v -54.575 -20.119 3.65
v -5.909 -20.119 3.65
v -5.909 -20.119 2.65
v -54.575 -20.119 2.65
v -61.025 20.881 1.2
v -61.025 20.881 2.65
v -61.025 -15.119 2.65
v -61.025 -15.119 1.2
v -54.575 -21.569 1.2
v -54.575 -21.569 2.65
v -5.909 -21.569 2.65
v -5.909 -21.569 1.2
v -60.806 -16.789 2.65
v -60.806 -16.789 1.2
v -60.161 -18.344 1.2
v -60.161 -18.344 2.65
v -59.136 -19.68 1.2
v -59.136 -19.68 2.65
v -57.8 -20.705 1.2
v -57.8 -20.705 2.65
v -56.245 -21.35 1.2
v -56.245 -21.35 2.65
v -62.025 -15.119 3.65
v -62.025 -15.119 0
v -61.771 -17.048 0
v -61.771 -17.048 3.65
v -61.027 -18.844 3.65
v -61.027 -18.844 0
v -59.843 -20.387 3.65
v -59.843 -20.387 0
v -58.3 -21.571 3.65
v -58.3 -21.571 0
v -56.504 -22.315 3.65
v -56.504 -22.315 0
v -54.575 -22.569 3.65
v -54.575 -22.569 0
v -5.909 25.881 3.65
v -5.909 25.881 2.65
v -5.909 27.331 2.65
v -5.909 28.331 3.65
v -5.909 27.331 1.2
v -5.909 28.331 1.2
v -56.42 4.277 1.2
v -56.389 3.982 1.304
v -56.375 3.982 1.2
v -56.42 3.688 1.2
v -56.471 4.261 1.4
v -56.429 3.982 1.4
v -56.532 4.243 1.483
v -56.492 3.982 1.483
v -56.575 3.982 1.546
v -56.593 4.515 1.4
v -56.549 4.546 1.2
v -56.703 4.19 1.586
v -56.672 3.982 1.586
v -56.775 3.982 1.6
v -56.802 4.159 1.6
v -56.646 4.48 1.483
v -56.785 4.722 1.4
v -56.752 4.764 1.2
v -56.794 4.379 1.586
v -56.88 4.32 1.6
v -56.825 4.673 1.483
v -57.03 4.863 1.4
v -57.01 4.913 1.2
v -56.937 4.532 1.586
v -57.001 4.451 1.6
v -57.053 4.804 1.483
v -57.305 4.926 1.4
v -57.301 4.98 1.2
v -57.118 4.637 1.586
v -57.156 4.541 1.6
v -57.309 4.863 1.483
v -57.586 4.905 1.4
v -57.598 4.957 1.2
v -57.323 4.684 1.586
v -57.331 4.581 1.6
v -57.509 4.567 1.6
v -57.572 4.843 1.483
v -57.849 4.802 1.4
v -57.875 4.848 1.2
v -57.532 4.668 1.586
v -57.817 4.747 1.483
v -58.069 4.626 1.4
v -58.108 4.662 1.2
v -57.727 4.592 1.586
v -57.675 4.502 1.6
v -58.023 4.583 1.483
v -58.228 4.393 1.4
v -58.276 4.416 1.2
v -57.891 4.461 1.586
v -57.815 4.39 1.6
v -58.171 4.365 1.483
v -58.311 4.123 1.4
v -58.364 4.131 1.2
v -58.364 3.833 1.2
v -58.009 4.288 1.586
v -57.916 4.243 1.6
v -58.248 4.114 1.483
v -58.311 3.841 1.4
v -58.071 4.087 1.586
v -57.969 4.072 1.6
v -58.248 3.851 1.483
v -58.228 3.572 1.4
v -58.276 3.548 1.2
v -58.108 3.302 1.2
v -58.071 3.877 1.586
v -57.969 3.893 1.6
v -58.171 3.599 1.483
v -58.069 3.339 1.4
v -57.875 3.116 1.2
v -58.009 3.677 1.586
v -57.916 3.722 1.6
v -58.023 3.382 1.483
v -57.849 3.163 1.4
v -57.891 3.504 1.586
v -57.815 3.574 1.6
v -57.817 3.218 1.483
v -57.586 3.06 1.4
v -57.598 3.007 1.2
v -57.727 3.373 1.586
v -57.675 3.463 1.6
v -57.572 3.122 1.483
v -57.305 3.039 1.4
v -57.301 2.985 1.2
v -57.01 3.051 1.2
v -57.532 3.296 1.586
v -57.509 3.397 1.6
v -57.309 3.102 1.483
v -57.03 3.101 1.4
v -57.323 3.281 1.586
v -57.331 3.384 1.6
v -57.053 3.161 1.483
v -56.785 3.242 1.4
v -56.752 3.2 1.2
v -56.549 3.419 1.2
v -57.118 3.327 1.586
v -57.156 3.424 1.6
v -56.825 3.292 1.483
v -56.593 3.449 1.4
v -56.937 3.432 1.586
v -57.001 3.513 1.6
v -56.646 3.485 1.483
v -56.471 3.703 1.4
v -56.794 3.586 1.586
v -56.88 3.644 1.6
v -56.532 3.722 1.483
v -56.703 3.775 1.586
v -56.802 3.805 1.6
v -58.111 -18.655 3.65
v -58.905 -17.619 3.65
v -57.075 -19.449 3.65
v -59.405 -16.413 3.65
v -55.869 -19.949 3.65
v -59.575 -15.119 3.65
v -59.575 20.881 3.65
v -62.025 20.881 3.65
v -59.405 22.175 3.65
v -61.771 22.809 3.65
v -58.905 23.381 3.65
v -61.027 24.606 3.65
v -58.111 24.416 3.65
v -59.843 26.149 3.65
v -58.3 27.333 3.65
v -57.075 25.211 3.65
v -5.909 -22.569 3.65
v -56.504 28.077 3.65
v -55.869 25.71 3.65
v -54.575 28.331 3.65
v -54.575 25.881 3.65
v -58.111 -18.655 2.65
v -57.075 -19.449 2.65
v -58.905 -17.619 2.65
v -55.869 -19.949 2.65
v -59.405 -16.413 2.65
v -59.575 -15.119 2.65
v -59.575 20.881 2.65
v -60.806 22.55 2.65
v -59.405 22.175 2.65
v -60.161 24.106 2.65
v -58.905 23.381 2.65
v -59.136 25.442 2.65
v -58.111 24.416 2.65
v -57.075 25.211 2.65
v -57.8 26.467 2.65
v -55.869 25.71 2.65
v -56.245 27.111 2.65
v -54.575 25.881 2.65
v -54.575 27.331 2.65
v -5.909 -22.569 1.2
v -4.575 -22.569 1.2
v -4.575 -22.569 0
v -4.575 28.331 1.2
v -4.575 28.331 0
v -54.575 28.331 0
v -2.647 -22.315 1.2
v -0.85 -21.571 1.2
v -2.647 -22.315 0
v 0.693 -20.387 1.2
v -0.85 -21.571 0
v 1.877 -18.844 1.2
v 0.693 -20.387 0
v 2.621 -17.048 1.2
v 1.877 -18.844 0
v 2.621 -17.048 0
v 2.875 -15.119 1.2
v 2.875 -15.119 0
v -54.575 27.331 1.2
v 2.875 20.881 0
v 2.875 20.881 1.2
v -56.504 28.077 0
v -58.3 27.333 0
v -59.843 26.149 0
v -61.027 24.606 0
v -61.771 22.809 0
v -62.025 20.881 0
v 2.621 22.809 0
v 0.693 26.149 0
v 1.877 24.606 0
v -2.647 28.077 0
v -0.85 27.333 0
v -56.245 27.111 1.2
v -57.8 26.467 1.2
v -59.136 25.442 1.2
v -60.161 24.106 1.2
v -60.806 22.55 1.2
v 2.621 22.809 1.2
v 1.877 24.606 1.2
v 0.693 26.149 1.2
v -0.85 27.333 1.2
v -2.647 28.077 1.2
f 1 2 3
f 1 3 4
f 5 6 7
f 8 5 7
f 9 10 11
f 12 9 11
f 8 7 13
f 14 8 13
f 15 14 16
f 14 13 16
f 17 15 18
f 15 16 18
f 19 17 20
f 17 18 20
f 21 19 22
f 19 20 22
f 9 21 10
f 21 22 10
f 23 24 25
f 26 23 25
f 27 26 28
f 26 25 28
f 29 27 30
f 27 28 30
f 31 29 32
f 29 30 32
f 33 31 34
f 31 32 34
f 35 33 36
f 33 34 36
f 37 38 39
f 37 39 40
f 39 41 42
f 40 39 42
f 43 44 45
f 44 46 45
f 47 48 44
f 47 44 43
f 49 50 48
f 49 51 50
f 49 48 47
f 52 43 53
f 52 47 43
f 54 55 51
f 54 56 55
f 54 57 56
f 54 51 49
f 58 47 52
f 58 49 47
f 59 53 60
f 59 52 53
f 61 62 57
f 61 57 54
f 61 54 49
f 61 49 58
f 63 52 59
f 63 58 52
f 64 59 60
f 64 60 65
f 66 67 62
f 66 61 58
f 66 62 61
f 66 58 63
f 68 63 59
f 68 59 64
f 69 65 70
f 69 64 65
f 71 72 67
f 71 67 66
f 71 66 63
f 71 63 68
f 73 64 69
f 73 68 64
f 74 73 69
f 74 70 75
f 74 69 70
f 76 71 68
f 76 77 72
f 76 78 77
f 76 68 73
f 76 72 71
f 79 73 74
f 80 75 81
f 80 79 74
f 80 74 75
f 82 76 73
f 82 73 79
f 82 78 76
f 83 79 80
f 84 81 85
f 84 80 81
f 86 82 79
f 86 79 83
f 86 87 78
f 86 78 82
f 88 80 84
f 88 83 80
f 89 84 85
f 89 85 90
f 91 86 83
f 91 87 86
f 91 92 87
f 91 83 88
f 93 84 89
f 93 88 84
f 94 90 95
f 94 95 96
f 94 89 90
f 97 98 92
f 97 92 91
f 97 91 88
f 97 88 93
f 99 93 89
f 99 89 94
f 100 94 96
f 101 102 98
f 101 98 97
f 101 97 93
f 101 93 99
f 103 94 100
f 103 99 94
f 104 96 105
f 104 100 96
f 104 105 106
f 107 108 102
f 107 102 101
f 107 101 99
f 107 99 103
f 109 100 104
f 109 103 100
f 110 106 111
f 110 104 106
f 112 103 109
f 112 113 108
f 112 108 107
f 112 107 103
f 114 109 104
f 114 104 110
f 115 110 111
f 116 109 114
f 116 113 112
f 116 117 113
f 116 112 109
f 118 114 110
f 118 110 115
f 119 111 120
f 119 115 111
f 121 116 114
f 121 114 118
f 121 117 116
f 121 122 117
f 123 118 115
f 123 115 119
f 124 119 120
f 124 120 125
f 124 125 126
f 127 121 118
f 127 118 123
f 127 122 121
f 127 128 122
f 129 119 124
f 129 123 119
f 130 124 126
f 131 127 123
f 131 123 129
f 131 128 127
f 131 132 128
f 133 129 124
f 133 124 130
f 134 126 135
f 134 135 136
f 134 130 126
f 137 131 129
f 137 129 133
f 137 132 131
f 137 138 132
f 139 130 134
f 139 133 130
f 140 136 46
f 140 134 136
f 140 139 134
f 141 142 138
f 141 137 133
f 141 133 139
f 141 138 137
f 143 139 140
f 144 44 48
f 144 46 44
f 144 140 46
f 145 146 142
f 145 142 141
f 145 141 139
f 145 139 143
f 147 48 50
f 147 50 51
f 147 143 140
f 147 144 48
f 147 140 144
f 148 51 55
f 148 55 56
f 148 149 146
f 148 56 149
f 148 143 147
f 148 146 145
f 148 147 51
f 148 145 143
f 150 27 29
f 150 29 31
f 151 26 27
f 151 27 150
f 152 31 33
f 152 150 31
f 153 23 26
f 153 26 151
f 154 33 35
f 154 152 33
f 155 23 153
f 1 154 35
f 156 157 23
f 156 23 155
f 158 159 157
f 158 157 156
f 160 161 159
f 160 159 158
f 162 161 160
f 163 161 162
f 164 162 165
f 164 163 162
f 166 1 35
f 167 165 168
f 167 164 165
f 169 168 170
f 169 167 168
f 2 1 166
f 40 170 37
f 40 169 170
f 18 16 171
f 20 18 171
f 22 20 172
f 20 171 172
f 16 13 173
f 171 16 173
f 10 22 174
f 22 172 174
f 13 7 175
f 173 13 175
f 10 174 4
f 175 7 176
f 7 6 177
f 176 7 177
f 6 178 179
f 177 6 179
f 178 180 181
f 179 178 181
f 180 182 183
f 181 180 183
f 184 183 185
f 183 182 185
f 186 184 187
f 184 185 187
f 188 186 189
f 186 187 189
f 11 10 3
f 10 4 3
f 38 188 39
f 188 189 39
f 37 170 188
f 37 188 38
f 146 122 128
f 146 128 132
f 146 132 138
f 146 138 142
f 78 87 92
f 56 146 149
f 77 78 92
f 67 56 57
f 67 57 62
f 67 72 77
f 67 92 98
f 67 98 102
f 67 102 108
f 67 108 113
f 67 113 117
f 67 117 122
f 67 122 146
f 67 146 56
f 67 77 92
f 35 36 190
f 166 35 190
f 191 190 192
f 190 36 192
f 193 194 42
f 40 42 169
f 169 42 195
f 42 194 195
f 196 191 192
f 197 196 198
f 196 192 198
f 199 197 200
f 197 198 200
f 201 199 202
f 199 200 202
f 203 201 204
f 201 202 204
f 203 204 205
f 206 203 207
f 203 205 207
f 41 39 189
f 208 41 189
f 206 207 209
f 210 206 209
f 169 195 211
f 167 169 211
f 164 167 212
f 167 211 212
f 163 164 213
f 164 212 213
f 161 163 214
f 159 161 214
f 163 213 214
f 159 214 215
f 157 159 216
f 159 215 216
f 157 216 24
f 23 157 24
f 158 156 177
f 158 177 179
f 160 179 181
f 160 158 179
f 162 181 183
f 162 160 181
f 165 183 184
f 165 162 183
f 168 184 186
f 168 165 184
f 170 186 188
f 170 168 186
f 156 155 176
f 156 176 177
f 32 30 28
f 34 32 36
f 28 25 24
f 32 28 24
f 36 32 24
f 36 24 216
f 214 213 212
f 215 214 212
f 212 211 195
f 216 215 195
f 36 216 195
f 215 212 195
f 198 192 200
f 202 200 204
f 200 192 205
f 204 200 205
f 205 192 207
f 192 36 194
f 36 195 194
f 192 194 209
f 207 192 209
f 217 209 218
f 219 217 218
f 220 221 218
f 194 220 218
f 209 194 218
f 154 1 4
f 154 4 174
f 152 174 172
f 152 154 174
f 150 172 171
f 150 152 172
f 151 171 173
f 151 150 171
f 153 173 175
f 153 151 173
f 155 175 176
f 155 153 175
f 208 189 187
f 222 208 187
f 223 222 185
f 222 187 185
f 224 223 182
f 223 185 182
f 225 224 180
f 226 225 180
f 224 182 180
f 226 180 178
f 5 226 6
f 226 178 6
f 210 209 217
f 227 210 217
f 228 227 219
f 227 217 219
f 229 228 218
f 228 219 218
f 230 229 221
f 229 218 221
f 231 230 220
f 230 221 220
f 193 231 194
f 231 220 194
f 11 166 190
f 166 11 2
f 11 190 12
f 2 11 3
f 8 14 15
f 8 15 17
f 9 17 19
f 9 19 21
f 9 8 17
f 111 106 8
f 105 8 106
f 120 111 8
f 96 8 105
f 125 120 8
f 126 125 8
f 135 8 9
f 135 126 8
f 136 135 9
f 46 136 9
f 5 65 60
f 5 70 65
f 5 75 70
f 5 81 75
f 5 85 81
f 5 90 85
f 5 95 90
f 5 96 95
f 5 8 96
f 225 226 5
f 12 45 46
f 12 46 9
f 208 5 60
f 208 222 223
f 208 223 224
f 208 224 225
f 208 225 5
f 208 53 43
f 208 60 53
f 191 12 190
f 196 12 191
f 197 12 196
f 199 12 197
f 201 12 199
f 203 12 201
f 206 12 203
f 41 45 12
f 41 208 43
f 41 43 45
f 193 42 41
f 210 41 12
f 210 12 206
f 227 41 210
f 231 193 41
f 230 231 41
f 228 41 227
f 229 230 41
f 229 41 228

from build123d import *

# Parameters (mm, degrees)
F1_DEPTH = 3.65
F3_DEPTH = 2.45
F5_DEPTH = 1
F6_W     = 11.5363439545
F6_H     = 60.74937433
F7_DEPTH = 25
F8_R     = 1
F9_DEPTH = 0.4
F10_R    = 0.39999


# Not quite as in the source:
# - a fillet or chamfer is up to 0.001 mm smaller than in the source, because OpenCascade refuses the exact size


with BuildPart() as f1:
    # F0 (on Top) → F1 (new body)
    with BuildSketch(Plane.XY):
        with BuildLine():
            ThreePointArc((-62.0253431911, -15.11933375), (-59.843288711, -20.3872792698), (-54.5753431911, -22.56933375))
            Line((-54.5753431911, -22.56933375), (-4.5753431911, -22.56933375))
            ThreePointArc((-4.5753431911, -22.56933375), (0.6926023287, -20.3872792698), (2.8746568089, -15.11933375))
            Line((2.8746568089, -15.11933375), (2.8746568089, 20.88066625))
            ThreePointArc((2.8746568089, 20.88066625), (0.6926023287, 26.1486117698), (-4.5753431911, 28.33066625))
            Line((-4.5753431911, 28.33066625), (-54.5753431911, 28.33066625))
            ThreePointArc((-54.5753431911, 28.33066625), (-59.843288711, 26.1486117698), (-62.0253431911, 20.88066625))
            Line((-62.0253431911, 20.88066625), (-62.0253431911, -15.11933375))
        make_face()
    extrude(amount=F1_DEPTH)

    # F2 (on face) → F3 (cut)
    with BuildSketch(Plane.XY.offset(3.65)):
        with BuildLine():
            Line((1.8746568089, -15.11933375), (1.8746568089, 20.88066625))
            ThreePointArc((1.8746568089, 20.88066625), (-0.0145044525, 25.4415049886), (-4.5753431911, 27.33066625))
            Line((-4.5753431911, 27.33066625), (-54.5753431911, 27.33066625))
            ThreePointArc((-54.5753431911, 27.33066625), (-59.1361819298, 25.4415049886), (-61.0253431911, 20.88066625))
            Line((-61.0253431911, 20.88066625), (-61.0253431911, -15.11933375))
            ThreePointArc((-61.0253431911, -15.11933375), (-59.1361819298, -19.6801724887), (-54.5753431911, -21.56933375))
            Line((-54.5753431911, -21.56933375), (-4.5753431911, -21.56933375))
            ThreePointArc((-4.5753431911, -21.56933375), (-0.0145044525, -19.6801724887), (1.8746568089, -15.11933375))
        make_face()
    extrude(amount=-F3_DEPTH, mode=Mode.SUBTRACT)

    # F4 (on face) → F5 (join)
    with BuildSketch(Plane.XY.offset(3.65)):
        with BuildLine():
            Line((1.8746568089, -15.11933375), (1.8746568089, 20.88066625))
            ThreePointArc((1.8746568089, 20.88066625), (-0.0145044525, 25.4415049886), (-4.5753431911, 27.33066625))
            Line((-4.5753431911, 27.33066625), (-54.5753431911, 27.33066625))
            ThreePointArc((-54.5753431911, 27.33066625), (-59.1361819298, 25.4415049886), (-61.0253431911, 20.88066625))
            Line((-61.0253431911, 20.88066625), (-61.0253431911, -15.11933375))
            ThreePointArc((-61.0253431911, -15.11933375), (-59.1361819298, -19.6801724887), (-54.5753431911, -21.56933375))
            Line((-54.5753431911, -21.56933375), (-4.5753431911, -21.56933375))
            ThreePointArc((-4.5753431911, -21.56933375), (-0.0145044525, -19.6801724887), (1.8746568089, -15.11933375))
        make_face()
        with BuildLine():
            ThreePointArc((-4.5753431911, 25.88066625), (-1.0398092852, 24.4162001559), (0.4246568089, 20.88066625))
            Line((0.4246568089, 20.88066625), (0.4246568089, -15.11933375))
            ThreePointArc((0.4246568089, -15.11933375), (-1.0398092852, -18.6548676559), (-4.5753431911, -20.11933375))
            Line((-4.5753431911, -20.11933375), (-54.5753431911, -20.11933375))
            ThreePointArc((-54.5753431911, -20.11933375), (-58.1108770971, -18.6548676559), (-59.5753431911, -15.11933375))
            Line((-59.5753431911, -15.11933375), (-59.5753431911, 20.88066625))
            ThreePointArc((-59.5753431911, 20.88066625), (-58.1108770971, 24.4162001559), (-54.5753431911, 25.88066625))
            Line((-54.5753431911, 25.88066625), (-4.5753431911, 25.88066625))
        make_face(mode=Mode.SUBTRACT)
    extrude(amount=-F5_DEPTH)

    # F6 (on face) → F7 (cut)
    with BuildSketch(Plane.XY.offset(1.2)):
        with Locations((-0.1405403018, 2.3494064808)):
            Rectangle(F6_W, F6_H)
    extrude(amount=F7_DEPTH, mode=Mode.SUBTRACT)

    # F8 (on face) → F9 (join)
    with BuildSketch(Plane.XY.offset(1.2)):
        with Locations((-57.3753431911, 3.9823222905)):
            Circle(F8_R)
    extrude(amount=F9_DEPTH)

    # F10 (radius 0.4 in the source; OpenCascade refuses exactly that, so slightly less here)
    f10_edges = [f1.edges().sort_by_distance(p)[0] for p in [
        (-58.375343, 3.982322, 1.6),
    ]]
    fillet(f10_edges, radius=F10_R)


solid = f1.part
